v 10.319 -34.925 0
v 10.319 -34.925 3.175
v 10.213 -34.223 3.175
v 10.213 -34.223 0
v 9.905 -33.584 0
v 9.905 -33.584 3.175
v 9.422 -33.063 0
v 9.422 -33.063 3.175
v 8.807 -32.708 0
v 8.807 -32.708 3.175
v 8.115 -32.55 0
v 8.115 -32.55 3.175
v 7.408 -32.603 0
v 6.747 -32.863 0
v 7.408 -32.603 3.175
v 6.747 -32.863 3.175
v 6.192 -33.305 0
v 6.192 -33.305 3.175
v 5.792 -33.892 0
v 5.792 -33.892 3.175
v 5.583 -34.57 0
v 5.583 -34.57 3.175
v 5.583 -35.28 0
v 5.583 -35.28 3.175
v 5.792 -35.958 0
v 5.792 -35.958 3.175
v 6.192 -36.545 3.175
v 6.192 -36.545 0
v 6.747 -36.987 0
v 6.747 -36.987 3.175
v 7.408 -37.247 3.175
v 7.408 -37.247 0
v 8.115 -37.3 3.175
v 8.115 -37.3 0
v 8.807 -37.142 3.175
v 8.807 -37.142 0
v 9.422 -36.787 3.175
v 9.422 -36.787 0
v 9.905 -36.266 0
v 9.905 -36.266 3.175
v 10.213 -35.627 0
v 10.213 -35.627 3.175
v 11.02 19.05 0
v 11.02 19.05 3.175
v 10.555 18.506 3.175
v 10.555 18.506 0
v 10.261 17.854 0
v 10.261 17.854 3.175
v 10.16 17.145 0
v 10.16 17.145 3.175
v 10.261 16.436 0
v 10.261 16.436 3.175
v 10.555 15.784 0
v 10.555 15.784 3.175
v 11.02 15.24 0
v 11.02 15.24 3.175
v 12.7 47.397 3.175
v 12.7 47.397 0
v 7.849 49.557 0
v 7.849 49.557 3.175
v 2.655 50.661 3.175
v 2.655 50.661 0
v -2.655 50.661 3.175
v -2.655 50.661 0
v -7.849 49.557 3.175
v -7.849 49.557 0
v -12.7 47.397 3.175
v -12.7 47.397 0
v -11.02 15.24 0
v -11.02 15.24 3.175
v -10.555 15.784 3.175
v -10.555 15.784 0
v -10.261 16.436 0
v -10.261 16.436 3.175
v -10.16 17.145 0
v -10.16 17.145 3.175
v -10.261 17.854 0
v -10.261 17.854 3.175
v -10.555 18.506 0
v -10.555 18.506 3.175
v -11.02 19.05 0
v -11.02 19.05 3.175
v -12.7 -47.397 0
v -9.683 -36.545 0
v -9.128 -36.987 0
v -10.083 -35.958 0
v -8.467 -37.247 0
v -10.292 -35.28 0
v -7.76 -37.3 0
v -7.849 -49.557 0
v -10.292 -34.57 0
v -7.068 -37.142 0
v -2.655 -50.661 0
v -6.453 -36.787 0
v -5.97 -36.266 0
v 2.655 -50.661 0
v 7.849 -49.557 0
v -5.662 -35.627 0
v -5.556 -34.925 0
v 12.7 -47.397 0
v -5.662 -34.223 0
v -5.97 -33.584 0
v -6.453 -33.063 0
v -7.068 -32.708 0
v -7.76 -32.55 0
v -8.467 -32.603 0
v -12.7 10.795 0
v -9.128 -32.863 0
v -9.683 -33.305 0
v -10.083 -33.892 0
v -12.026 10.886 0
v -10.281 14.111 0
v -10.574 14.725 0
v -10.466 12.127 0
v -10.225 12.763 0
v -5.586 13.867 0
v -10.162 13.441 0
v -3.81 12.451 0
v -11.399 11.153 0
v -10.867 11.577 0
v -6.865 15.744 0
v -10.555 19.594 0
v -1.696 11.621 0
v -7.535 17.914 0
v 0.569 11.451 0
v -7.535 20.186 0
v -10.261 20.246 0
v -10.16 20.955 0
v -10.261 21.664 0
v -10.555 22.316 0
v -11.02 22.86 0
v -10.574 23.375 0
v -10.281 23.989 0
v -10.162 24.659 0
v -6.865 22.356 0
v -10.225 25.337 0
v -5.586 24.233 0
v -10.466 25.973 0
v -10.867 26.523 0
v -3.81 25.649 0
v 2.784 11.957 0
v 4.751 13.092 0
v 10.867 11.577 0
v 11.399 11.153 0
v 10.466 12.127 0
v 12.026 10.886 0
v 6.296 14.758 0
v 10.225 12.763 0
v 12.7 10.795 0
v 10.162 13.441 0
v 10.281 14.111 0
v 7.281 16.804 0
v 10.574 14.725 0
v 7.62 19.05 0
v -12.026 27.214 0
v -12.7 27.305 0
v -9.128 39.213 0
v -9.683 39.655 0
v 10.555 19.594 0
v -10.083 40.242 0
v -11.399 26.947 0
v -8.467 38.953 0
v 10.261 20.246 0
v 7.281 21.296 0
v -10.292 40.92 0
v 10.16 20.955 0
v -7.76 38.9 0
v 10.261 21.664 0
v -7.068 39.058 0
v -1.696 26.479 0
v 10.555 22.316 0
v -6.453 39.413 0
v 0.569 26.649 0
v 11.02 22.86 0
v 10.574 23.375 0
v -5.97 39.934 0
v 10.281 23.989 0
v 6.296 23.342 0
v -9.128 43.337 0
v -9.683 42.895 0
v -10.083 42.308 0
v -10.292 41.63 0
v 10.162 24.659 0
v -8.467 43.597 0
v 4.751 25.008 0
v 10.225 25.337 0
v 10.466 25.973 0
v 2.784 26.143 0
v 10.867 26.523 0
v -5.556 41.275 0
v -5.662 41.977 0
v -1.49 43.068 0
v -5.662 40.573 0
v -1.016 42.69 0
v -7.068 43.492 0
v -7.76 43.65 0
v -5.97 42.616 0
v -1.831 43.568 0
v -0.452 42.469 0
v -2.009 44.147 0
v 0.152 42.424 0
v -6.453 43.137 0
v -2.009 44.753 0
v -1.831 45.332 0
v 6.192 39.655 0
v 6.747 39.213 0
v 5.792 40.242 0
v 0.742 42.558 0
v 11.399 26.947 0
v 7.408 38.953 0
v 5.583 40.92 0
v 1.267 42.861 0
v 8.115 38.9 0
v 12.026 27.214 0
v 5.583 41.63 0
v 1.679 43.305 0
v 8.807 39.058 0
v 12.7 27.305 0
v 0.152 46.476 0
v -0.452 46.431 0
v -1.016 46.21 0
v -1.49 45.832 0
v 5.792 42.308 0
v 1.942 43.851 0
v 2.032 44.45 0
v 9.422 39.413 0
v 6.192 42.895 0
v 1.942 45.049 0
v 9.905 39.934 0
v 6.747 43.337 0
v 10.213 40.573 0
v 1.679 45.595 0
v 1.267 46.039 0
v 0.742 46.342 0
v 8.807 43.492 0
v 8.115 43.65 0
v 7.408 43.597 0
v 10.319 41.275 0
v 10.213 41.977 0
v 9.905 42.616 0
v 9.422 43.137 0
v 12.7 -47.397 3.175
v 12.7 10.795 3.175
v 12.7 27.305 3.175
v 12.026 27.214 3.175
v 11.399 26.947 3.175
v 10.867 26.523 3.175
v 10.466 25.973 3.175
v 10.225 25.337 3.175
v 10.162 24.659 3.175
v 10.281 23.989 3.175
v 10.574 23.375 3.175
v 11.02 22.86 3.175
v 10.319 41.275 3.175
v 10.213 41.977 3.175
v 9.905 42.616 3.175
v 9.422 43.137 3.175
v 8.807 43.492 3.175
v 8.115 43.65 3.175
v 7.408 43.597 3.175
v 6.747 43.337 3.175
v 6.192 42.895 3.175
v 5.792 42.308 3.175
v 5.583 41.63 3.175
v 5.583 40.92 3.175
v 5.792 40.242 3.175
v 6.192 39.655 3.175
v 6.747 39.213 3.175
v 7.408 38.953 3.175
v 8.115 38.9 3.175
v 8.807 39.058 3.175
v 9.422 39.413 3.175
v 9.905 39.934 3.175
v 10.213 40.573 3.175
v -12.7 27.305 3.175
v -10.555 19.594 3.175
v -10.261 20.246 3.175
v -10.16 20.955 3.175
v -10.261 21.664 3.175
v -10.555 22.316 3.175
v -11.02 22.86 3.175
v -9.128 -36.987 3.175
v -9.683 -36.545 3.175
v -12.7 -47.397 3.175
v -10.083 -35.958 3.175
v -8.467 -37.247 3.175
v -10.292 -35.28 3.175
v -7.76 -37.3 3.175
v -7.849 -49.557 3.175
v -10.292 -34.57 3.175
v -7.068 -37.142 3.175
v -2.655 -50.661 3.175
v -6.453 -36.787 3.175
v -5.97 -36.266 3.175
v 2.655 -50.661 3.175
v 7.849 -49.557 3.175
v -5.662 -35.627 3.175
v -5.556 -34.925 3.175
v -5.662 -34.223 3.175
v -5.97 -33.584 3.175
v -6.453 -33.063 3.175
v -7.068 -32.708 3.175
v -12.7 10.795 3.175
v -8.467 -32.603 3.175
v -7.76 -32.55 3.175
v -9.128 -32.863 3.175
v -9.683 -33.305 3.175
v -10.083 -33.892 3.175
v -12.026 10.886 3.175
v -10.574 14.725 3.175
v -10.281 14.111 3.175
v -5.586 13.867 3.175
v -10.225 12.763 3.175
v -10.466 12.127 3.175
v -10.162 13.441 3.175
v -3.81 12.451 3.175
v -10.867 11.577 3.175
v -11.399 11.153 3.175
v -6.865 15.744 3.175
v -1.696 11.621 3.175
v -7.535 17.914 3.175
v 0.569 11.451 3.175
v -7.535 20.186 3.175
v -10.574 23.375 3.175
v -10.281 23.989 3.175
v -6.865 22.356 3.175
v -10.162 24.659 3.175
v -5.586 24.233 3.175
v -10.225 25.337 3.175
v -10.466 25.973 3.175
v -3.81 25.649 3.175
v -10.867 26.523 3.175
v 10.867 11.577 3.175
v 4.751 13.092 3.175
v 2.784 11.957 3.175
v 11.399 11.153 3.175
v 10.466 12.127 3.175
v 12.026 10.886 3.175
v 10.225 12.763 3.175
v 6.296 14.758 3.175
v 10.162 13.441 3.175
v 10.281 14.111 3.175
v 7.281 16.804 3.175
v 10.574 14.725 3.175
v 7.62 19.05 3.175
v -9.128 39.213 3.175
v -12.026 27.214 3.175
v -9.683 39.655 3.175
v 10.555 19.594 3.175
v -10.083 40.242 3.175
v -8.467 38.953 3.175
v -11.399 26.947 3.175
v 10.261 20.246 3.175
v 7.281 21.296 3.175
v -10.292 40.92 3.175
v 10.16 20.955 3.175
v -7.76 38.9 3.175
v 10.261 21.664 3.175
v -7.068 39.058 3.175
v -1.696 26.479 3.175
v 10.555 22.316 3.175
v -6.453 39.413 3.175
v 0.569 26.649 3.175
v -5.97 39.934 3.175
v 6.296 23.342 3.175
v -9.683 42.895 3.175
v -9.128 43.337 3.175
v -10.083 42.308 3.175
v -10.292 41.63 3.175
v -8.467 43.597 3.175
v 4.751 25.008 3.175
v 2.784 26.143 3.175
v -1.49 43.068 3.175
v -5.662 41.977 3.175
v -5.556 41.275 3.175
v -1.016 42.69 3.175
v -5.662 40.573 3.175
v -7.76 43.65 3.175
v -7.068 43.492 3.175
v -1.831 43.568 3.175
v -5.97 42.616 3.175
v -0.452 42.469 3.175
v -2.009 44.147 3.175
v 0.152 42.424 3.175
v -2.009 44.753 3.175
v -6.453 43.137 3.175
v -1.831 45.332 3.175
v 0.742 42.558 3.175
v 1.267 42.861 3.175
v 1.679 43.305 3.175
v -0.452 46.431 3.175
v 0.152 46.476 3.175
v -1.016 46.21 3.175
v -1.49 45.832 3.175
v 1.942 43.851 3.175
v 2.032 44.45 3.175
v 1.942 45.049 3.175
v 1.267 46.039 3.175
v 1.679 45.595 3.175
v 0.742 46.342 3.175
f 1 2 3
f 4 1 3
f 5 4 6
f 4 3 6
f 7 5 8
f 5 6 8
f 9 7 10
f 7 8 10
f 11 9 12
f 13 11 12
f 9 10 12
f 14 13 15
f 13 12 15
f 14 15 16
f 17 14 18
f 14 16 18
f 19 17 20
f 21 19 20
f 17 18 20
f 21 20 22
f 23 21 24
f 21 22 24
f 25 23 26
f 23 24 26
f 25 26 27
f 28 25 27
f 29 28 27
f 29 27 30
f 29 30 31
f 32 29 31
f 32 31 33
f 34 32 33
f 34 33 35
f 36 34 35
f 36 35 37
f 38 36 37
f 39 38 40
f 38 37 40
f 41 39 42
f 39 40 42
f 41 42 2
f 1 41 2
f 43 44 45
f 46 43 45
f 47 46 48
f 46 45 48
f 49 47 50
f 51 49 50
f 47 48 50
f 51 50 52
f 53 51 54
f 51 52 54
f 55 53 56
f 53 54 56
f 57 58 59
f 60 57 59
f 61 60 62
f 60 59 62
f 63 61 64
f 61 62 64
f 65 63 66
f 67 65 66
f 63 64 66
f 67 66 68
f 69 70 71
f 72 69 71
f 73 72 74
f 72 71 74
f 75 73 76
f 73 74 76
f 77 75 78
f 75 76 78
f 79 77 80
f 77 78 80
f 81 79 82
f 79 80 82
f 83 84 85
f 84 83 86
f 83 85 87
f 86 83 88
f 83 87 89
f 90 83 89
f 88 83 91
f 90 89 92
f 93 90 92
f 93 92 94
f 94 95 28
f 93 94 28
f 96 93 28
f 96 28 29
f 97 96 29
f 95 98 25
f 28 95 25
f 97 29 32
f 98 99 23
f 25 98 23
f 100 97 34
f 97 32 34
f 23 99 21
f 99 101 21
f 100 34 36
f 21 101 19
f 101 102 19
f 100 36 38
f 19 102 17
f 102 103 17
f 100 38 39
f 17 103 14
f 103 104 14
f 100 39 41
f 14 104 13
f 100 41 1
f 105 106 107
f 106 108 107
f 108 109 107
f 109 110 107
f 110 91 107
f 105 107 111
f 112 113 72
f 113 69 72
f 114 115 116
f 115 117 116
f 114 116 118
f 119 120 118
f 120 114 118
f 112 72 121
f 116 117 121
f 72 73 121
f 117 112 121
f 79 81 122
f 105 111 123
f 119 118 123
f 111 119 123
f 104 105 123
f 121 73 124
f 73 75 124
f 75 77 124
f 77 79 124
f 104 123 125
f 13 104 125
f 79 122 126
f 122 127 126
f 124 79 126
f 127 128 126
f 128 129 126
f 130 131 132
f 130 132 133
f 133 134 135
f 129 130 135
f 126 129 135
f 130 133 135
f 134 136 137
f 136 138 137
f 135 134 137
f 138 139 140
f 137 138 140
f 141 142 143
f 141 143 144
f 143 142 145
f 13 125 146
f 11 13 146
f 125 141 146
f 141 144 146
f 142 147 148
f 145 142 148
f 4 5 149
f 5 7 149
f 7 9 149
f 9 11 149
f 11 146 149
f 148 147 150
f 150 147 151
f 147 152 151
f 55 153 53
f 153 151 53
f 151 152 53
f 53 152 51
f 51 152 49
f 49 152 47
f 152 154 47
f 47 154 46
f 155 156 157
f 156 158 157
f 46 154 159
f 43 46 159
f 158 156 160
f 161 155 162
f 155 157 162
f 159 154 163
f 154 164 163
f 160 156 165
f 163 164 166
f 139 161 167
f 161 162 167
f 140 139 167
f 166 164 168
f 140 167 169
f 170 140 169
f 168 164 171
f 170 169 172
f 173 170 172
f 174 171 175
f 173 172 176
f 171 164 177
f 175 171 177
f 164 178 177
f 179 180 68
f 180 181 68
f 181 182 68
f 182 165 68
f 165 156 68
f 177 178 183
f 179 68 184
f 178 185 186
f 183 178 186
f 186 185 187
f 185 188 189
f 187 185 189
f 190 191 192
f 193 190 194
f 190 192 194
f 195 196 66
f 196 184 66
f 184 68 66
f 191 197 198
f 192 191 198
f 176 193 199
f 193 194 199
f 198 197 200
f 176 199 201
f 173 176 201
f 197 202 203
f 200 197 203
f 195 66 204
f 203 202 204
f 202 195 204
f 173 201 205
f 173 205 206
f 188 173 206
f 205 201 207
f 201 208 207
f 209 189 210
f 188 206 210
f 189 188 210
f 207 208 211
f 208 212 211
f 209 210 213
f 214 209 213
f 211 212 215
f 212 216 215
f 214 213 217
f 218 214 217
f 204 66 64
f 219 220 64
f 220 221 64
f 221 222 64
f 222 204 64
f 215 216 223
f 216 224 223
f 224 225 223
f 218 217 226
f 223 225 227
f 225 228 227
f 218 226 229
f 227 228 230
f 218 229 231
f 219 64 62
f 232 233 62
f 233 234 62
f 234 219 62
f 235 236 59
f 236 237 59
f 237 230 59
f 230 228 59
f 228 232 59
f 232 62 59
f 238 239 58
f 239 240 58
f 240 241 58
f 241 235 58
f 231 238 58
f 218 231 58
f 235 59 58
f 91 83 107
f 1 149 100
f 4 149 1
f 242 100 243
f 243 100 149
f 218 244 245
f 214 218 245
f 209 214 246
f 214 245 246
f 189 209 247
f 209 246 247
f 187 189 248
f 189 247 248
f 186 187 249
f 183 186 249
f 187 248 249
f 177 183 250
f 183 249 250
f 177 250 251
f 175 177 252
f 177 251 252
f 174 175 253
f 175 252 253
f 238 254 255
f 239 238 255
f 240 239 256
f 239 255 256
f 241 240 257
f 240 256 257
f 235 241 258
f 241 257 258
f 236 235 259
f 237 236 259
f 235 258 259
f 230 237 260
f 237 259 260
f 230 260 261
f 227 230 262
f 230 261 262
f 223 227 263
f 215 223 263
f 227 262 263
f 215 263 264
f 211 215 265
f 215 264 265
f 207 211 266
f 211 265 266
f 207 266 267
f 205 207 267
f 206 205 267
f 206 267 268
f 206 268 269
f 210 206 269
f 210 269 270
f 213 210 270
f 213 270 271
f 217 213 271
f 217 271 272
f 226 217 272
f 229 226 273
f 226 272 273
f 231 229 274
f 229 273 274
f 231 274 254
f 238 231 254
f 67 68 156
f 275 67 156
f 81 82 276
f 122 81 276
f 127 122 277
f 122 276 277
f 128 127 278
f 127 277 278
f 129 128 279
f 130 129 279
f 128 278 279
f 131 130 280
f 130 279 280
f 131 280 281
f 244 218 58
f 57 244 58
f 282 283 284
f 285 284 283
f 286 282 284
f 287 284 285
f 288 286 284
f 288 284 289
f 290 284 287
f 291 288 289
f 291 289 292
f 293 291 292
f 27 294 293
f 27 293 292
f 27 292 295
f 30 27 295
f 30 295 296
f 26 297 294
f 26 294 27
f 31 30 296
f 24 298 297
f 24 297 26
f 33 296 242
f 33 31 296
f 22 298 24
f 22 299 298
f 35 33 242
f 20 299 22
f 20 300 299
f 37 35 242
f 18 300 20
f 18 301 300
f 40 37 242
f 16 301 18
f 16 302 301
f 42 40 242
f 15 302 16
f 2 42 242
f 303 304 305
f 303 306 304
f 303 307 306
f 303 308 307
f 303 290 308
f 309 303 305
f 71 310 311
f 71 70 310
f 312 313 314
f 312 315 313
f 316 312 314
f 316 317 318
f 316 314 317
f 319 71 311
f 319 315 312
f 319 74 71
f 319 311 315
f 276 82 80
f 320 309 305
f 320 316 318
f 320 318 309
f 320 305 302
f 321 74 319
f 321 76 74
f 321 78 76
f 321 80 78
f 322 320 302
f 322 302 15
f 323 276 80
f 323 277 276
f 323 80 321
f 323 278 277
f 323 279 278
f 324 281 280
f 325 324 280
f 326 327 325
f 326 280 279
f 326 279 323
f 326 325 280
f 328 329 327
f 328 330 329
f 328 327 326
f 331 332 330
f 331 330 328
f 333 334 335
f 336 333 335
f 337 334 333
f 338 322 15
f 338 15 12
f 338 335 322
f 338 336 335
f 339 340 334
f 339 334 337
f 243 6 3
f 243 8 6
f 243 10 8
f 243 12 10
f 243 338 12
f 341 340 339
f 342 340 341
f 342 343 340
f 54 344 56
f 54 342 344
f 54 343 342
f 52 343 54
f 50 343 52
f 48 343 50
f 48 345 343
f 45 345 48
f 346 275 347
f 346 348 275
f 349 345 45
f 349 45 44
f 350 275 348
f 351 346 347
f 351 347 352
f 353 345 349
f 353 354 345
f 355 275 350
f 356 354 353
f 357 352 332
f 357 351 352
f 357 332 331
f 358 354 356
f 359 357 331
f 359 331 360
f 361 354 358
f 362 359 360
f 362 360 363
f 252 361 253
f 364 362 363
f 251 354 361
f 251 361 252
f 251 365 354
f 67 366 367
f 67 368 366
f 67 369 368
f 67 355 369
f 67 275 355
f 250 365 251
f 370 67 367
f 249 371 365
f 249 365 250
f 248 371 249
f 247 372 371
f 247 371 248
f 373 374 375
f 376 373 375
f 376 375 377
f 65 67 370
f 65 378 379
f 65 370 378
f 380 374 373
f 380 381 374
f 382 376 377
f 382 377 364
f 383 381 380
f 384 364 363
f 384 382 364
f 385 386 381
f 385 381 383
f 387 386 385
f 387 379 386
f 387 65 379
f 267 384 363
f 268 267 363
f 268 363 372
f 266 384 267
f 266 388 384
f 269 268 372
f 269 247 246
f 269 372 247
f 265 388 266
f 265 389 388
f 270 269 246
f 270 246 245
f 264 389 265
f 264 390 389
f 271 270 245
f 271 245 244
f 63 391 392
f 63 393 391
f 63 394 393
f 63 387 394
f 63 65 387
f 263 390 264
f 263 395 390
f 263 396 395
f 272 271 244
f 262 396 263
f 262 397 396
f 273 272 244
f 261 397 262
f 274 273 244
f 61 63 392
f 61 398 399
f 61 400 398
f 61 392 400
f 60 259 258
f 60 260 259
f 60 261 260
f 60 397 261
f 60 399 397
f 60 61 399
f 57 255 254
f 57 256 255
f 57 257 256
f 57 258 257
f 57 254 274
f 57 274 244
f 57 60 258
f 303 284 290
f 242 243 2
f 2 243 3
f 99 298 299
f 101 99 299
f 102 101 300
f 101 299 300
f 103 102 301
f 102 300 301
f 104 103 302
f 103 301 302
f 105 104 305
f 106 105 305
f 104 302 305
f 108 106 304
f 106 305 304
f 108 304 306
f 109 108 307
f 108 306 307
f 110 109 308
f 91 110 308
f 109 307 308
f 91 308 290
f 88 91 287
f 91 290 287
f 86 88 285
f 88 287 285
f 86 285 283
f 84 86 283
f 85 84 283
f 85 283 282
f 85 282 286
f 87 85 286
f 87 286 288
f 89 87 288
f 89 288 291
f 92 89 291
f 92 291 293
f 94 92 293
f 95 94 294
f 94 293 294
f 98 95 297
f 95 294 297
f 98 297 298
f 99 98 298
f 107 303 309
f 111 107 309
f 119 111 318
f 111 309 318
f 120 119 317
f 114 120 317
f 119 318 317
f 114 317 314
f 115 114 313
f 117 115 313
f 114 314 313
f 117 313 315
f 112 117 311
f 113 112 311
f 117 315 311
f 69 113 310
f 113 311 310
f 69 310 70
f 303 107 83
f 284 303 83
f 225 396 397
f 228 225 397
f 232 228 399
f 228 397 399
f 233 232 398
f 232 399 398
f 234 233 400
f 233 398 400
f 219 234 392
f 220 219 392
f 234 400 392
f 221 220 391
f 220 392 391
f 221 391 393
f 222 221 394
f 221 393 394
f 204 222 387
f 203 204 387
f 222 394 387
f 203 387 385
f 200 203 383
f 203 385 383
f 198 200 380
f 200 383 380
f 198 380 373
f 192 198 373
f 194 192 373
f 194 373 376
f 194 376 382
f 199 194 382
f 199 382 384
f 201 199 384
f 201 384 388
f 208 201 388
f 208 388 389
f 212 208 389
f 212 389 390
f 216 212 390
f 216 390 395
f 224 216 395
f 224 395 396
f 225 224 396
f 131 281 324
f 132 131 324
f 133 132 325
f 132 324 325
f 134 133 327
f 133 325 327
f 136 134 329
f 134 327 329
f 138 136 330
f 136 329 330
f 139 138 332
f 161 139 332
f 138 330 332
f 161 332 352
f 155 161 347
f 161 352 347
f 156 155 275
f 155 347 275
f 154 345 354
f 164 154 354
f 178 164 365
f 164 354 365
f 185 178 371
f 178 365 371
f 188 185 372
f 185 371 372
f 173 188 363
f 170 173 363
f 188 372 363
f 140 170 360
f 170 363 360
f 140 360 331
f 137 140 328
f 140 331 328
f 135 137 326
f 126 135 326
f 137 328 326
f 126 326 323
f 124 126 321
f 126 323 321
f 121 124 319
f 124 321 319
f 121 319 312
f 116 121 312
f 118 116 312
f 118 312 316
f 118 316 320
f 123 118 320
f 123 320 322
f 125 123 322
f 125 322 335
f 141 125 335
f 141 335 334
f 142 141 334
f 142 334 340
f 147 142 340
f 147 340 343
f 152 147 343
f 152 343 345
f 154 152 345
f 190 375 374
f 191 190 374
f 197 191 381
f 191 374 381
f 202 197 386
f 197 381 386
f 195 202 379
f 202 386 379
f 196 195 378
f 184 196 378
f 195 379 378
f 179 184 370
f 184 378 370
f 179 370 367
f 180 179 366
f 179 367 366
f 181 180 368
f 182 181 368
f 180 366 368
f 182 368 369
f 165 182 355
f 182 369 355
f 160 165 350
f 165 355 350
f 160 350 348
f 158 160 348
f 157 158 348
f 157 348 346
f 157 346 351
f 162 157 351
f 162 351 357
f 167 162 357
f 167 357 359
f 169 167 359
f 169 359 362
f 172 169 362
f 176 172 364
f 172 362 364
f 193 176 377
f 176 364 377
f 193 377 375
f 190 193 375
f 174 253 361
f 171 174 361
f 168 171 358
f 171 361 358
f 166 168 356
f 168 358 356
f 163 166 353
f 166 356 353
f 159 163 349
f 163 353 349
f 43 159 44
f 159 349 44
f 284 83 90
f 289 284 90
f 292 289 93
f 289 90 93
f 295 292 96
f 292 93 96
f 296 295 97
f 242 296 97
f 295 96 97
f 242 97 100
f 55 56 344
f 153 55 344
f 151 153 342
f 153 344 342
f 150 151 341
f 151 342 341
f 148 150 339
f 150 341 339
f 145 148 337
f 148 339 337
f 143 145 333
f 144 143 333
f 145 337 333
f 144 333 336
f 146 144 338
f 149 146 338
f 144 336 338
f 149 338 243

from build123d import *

# Parameters (mm, degrees)
F1_DEPTH = 3.175
F2_R     = 2.38125
F3_DEPTH = 3.175
F4_R     = 7.62
F4_R_2   = 2.032
F5_DEPTH = 25.4


# Not quite as in the source:
# - a feature names something its author has since deleted; it is built from what else it names


with BuildPart() as f1:
    # F0 (on Top) → F1 (new body)
    with BuildSketch(Plane.XY):
        with BuildLine():
            Line((12.7, 0), (12.7, 47.3970452561))
            ThreePointArc((12.7, 47.3970452561), (0, 50.8), (-12.7, 47.3970452561))
            Line((-12.7, 47.3970452561), (-12.7, 0))
            Line((-12.7, 0), (0, 0))
            Line((0, 0), (12.7, 0))
        make_face()
        with BuildLine():
            Line((12.7, -47.3970452561), (12.7, 0))
            Line((12.7, 0), (0, 0))
            Line((0, 0), (-12.7, 0))
            Line((-12.7, 0), (-12.7, -47.3970452561))
            ThreePointArc((-12.7, -47.3970452561), (0, -50.8), (12.7, -47.3970452561))
        make_face()
    extrude(amount=F1_DEPTH)

    # F2 (on face) → F3 (cut, through all)
    with BuildSketch(Plane.XY.offset(3.175)):
        with Locations((-7.9375, 41.275)):
            Circle(F2_R)
        with Locations((7.9375, 41.275)):
            Circle(F2_R)
        with Locations((-7.9375, -34.925)):
            Circle(F2_R)
        with Locations((7.9375, -34.925)):
            Circle(F2_R)
    extrude(amount=-F3_DEPTH, mode=Mode.SUBTRACT)

    # F4 (on face) → F5 (cut)
    with BuildSketch(Plane.XY.offset(3.175)):
        with Locations((0, 19.05)):
            Circle(F4_R)
        with BuildLine():
            ThreePointArc((-11.0199479175, 19.05), (-10.16, 20.955), (-11.0199479175, 22.86))
            ThreePointArc((-11.0199479175, 22.86), (-10.3240475594, 25.6630256121), (-12.7, 27.305))
            Line((-12.7, 27.305), (-12.7, 23.495))
            Line((-12.7, 23.495), (-12.7, 22.225))
            Line((-12.7, 22.225), (-12.7, 19.685))
            Line((-12.7, 19.685), (-12.7, 18.415))
            Line((-12.7, 18.415), (-12.7, 15.875))
            Line((-12.7, 15.875), (-12.7, 14.605))
            Line((-12.7, 14.605), (-12.7, 10.795))
            ThreePointArc((-12.7, 10.795), (-10.3240475594, 12.4369743879), (-11.0199479175, 15.24))
            ThreePointArc((-11.0199479175, 15.24), (-10.16, 17.145), (-11.0199479175, 19.05))
        make_face()
        with BuildLine():
            Line((12.7, 10.795), (12.7, 27.305))
            ThreePointArc((12.7, 27.305), (10.3240475594, 25.6630256121), (11.0199479175, 22.86))
            ThreePointArc((11.0199479175, 22.86), (10.16, 20.955), (11.0199479175, 19.05))
            ThreePointArc((11.0199479175, 19.05), (10.16, 17.145), (11.0199479175, 15.24))
            ThreePointArc((11.0199479175, 15.24), (10.3240475594, 12.4369743879), (12.7, 10.795))
        make_face()
        with Locations((0, 44.45)):
            Circle(F4_R_2)
    extrude(amount=-F5_DEPTH, mode=Mode.SUBTRACT)


solid = f1.part
